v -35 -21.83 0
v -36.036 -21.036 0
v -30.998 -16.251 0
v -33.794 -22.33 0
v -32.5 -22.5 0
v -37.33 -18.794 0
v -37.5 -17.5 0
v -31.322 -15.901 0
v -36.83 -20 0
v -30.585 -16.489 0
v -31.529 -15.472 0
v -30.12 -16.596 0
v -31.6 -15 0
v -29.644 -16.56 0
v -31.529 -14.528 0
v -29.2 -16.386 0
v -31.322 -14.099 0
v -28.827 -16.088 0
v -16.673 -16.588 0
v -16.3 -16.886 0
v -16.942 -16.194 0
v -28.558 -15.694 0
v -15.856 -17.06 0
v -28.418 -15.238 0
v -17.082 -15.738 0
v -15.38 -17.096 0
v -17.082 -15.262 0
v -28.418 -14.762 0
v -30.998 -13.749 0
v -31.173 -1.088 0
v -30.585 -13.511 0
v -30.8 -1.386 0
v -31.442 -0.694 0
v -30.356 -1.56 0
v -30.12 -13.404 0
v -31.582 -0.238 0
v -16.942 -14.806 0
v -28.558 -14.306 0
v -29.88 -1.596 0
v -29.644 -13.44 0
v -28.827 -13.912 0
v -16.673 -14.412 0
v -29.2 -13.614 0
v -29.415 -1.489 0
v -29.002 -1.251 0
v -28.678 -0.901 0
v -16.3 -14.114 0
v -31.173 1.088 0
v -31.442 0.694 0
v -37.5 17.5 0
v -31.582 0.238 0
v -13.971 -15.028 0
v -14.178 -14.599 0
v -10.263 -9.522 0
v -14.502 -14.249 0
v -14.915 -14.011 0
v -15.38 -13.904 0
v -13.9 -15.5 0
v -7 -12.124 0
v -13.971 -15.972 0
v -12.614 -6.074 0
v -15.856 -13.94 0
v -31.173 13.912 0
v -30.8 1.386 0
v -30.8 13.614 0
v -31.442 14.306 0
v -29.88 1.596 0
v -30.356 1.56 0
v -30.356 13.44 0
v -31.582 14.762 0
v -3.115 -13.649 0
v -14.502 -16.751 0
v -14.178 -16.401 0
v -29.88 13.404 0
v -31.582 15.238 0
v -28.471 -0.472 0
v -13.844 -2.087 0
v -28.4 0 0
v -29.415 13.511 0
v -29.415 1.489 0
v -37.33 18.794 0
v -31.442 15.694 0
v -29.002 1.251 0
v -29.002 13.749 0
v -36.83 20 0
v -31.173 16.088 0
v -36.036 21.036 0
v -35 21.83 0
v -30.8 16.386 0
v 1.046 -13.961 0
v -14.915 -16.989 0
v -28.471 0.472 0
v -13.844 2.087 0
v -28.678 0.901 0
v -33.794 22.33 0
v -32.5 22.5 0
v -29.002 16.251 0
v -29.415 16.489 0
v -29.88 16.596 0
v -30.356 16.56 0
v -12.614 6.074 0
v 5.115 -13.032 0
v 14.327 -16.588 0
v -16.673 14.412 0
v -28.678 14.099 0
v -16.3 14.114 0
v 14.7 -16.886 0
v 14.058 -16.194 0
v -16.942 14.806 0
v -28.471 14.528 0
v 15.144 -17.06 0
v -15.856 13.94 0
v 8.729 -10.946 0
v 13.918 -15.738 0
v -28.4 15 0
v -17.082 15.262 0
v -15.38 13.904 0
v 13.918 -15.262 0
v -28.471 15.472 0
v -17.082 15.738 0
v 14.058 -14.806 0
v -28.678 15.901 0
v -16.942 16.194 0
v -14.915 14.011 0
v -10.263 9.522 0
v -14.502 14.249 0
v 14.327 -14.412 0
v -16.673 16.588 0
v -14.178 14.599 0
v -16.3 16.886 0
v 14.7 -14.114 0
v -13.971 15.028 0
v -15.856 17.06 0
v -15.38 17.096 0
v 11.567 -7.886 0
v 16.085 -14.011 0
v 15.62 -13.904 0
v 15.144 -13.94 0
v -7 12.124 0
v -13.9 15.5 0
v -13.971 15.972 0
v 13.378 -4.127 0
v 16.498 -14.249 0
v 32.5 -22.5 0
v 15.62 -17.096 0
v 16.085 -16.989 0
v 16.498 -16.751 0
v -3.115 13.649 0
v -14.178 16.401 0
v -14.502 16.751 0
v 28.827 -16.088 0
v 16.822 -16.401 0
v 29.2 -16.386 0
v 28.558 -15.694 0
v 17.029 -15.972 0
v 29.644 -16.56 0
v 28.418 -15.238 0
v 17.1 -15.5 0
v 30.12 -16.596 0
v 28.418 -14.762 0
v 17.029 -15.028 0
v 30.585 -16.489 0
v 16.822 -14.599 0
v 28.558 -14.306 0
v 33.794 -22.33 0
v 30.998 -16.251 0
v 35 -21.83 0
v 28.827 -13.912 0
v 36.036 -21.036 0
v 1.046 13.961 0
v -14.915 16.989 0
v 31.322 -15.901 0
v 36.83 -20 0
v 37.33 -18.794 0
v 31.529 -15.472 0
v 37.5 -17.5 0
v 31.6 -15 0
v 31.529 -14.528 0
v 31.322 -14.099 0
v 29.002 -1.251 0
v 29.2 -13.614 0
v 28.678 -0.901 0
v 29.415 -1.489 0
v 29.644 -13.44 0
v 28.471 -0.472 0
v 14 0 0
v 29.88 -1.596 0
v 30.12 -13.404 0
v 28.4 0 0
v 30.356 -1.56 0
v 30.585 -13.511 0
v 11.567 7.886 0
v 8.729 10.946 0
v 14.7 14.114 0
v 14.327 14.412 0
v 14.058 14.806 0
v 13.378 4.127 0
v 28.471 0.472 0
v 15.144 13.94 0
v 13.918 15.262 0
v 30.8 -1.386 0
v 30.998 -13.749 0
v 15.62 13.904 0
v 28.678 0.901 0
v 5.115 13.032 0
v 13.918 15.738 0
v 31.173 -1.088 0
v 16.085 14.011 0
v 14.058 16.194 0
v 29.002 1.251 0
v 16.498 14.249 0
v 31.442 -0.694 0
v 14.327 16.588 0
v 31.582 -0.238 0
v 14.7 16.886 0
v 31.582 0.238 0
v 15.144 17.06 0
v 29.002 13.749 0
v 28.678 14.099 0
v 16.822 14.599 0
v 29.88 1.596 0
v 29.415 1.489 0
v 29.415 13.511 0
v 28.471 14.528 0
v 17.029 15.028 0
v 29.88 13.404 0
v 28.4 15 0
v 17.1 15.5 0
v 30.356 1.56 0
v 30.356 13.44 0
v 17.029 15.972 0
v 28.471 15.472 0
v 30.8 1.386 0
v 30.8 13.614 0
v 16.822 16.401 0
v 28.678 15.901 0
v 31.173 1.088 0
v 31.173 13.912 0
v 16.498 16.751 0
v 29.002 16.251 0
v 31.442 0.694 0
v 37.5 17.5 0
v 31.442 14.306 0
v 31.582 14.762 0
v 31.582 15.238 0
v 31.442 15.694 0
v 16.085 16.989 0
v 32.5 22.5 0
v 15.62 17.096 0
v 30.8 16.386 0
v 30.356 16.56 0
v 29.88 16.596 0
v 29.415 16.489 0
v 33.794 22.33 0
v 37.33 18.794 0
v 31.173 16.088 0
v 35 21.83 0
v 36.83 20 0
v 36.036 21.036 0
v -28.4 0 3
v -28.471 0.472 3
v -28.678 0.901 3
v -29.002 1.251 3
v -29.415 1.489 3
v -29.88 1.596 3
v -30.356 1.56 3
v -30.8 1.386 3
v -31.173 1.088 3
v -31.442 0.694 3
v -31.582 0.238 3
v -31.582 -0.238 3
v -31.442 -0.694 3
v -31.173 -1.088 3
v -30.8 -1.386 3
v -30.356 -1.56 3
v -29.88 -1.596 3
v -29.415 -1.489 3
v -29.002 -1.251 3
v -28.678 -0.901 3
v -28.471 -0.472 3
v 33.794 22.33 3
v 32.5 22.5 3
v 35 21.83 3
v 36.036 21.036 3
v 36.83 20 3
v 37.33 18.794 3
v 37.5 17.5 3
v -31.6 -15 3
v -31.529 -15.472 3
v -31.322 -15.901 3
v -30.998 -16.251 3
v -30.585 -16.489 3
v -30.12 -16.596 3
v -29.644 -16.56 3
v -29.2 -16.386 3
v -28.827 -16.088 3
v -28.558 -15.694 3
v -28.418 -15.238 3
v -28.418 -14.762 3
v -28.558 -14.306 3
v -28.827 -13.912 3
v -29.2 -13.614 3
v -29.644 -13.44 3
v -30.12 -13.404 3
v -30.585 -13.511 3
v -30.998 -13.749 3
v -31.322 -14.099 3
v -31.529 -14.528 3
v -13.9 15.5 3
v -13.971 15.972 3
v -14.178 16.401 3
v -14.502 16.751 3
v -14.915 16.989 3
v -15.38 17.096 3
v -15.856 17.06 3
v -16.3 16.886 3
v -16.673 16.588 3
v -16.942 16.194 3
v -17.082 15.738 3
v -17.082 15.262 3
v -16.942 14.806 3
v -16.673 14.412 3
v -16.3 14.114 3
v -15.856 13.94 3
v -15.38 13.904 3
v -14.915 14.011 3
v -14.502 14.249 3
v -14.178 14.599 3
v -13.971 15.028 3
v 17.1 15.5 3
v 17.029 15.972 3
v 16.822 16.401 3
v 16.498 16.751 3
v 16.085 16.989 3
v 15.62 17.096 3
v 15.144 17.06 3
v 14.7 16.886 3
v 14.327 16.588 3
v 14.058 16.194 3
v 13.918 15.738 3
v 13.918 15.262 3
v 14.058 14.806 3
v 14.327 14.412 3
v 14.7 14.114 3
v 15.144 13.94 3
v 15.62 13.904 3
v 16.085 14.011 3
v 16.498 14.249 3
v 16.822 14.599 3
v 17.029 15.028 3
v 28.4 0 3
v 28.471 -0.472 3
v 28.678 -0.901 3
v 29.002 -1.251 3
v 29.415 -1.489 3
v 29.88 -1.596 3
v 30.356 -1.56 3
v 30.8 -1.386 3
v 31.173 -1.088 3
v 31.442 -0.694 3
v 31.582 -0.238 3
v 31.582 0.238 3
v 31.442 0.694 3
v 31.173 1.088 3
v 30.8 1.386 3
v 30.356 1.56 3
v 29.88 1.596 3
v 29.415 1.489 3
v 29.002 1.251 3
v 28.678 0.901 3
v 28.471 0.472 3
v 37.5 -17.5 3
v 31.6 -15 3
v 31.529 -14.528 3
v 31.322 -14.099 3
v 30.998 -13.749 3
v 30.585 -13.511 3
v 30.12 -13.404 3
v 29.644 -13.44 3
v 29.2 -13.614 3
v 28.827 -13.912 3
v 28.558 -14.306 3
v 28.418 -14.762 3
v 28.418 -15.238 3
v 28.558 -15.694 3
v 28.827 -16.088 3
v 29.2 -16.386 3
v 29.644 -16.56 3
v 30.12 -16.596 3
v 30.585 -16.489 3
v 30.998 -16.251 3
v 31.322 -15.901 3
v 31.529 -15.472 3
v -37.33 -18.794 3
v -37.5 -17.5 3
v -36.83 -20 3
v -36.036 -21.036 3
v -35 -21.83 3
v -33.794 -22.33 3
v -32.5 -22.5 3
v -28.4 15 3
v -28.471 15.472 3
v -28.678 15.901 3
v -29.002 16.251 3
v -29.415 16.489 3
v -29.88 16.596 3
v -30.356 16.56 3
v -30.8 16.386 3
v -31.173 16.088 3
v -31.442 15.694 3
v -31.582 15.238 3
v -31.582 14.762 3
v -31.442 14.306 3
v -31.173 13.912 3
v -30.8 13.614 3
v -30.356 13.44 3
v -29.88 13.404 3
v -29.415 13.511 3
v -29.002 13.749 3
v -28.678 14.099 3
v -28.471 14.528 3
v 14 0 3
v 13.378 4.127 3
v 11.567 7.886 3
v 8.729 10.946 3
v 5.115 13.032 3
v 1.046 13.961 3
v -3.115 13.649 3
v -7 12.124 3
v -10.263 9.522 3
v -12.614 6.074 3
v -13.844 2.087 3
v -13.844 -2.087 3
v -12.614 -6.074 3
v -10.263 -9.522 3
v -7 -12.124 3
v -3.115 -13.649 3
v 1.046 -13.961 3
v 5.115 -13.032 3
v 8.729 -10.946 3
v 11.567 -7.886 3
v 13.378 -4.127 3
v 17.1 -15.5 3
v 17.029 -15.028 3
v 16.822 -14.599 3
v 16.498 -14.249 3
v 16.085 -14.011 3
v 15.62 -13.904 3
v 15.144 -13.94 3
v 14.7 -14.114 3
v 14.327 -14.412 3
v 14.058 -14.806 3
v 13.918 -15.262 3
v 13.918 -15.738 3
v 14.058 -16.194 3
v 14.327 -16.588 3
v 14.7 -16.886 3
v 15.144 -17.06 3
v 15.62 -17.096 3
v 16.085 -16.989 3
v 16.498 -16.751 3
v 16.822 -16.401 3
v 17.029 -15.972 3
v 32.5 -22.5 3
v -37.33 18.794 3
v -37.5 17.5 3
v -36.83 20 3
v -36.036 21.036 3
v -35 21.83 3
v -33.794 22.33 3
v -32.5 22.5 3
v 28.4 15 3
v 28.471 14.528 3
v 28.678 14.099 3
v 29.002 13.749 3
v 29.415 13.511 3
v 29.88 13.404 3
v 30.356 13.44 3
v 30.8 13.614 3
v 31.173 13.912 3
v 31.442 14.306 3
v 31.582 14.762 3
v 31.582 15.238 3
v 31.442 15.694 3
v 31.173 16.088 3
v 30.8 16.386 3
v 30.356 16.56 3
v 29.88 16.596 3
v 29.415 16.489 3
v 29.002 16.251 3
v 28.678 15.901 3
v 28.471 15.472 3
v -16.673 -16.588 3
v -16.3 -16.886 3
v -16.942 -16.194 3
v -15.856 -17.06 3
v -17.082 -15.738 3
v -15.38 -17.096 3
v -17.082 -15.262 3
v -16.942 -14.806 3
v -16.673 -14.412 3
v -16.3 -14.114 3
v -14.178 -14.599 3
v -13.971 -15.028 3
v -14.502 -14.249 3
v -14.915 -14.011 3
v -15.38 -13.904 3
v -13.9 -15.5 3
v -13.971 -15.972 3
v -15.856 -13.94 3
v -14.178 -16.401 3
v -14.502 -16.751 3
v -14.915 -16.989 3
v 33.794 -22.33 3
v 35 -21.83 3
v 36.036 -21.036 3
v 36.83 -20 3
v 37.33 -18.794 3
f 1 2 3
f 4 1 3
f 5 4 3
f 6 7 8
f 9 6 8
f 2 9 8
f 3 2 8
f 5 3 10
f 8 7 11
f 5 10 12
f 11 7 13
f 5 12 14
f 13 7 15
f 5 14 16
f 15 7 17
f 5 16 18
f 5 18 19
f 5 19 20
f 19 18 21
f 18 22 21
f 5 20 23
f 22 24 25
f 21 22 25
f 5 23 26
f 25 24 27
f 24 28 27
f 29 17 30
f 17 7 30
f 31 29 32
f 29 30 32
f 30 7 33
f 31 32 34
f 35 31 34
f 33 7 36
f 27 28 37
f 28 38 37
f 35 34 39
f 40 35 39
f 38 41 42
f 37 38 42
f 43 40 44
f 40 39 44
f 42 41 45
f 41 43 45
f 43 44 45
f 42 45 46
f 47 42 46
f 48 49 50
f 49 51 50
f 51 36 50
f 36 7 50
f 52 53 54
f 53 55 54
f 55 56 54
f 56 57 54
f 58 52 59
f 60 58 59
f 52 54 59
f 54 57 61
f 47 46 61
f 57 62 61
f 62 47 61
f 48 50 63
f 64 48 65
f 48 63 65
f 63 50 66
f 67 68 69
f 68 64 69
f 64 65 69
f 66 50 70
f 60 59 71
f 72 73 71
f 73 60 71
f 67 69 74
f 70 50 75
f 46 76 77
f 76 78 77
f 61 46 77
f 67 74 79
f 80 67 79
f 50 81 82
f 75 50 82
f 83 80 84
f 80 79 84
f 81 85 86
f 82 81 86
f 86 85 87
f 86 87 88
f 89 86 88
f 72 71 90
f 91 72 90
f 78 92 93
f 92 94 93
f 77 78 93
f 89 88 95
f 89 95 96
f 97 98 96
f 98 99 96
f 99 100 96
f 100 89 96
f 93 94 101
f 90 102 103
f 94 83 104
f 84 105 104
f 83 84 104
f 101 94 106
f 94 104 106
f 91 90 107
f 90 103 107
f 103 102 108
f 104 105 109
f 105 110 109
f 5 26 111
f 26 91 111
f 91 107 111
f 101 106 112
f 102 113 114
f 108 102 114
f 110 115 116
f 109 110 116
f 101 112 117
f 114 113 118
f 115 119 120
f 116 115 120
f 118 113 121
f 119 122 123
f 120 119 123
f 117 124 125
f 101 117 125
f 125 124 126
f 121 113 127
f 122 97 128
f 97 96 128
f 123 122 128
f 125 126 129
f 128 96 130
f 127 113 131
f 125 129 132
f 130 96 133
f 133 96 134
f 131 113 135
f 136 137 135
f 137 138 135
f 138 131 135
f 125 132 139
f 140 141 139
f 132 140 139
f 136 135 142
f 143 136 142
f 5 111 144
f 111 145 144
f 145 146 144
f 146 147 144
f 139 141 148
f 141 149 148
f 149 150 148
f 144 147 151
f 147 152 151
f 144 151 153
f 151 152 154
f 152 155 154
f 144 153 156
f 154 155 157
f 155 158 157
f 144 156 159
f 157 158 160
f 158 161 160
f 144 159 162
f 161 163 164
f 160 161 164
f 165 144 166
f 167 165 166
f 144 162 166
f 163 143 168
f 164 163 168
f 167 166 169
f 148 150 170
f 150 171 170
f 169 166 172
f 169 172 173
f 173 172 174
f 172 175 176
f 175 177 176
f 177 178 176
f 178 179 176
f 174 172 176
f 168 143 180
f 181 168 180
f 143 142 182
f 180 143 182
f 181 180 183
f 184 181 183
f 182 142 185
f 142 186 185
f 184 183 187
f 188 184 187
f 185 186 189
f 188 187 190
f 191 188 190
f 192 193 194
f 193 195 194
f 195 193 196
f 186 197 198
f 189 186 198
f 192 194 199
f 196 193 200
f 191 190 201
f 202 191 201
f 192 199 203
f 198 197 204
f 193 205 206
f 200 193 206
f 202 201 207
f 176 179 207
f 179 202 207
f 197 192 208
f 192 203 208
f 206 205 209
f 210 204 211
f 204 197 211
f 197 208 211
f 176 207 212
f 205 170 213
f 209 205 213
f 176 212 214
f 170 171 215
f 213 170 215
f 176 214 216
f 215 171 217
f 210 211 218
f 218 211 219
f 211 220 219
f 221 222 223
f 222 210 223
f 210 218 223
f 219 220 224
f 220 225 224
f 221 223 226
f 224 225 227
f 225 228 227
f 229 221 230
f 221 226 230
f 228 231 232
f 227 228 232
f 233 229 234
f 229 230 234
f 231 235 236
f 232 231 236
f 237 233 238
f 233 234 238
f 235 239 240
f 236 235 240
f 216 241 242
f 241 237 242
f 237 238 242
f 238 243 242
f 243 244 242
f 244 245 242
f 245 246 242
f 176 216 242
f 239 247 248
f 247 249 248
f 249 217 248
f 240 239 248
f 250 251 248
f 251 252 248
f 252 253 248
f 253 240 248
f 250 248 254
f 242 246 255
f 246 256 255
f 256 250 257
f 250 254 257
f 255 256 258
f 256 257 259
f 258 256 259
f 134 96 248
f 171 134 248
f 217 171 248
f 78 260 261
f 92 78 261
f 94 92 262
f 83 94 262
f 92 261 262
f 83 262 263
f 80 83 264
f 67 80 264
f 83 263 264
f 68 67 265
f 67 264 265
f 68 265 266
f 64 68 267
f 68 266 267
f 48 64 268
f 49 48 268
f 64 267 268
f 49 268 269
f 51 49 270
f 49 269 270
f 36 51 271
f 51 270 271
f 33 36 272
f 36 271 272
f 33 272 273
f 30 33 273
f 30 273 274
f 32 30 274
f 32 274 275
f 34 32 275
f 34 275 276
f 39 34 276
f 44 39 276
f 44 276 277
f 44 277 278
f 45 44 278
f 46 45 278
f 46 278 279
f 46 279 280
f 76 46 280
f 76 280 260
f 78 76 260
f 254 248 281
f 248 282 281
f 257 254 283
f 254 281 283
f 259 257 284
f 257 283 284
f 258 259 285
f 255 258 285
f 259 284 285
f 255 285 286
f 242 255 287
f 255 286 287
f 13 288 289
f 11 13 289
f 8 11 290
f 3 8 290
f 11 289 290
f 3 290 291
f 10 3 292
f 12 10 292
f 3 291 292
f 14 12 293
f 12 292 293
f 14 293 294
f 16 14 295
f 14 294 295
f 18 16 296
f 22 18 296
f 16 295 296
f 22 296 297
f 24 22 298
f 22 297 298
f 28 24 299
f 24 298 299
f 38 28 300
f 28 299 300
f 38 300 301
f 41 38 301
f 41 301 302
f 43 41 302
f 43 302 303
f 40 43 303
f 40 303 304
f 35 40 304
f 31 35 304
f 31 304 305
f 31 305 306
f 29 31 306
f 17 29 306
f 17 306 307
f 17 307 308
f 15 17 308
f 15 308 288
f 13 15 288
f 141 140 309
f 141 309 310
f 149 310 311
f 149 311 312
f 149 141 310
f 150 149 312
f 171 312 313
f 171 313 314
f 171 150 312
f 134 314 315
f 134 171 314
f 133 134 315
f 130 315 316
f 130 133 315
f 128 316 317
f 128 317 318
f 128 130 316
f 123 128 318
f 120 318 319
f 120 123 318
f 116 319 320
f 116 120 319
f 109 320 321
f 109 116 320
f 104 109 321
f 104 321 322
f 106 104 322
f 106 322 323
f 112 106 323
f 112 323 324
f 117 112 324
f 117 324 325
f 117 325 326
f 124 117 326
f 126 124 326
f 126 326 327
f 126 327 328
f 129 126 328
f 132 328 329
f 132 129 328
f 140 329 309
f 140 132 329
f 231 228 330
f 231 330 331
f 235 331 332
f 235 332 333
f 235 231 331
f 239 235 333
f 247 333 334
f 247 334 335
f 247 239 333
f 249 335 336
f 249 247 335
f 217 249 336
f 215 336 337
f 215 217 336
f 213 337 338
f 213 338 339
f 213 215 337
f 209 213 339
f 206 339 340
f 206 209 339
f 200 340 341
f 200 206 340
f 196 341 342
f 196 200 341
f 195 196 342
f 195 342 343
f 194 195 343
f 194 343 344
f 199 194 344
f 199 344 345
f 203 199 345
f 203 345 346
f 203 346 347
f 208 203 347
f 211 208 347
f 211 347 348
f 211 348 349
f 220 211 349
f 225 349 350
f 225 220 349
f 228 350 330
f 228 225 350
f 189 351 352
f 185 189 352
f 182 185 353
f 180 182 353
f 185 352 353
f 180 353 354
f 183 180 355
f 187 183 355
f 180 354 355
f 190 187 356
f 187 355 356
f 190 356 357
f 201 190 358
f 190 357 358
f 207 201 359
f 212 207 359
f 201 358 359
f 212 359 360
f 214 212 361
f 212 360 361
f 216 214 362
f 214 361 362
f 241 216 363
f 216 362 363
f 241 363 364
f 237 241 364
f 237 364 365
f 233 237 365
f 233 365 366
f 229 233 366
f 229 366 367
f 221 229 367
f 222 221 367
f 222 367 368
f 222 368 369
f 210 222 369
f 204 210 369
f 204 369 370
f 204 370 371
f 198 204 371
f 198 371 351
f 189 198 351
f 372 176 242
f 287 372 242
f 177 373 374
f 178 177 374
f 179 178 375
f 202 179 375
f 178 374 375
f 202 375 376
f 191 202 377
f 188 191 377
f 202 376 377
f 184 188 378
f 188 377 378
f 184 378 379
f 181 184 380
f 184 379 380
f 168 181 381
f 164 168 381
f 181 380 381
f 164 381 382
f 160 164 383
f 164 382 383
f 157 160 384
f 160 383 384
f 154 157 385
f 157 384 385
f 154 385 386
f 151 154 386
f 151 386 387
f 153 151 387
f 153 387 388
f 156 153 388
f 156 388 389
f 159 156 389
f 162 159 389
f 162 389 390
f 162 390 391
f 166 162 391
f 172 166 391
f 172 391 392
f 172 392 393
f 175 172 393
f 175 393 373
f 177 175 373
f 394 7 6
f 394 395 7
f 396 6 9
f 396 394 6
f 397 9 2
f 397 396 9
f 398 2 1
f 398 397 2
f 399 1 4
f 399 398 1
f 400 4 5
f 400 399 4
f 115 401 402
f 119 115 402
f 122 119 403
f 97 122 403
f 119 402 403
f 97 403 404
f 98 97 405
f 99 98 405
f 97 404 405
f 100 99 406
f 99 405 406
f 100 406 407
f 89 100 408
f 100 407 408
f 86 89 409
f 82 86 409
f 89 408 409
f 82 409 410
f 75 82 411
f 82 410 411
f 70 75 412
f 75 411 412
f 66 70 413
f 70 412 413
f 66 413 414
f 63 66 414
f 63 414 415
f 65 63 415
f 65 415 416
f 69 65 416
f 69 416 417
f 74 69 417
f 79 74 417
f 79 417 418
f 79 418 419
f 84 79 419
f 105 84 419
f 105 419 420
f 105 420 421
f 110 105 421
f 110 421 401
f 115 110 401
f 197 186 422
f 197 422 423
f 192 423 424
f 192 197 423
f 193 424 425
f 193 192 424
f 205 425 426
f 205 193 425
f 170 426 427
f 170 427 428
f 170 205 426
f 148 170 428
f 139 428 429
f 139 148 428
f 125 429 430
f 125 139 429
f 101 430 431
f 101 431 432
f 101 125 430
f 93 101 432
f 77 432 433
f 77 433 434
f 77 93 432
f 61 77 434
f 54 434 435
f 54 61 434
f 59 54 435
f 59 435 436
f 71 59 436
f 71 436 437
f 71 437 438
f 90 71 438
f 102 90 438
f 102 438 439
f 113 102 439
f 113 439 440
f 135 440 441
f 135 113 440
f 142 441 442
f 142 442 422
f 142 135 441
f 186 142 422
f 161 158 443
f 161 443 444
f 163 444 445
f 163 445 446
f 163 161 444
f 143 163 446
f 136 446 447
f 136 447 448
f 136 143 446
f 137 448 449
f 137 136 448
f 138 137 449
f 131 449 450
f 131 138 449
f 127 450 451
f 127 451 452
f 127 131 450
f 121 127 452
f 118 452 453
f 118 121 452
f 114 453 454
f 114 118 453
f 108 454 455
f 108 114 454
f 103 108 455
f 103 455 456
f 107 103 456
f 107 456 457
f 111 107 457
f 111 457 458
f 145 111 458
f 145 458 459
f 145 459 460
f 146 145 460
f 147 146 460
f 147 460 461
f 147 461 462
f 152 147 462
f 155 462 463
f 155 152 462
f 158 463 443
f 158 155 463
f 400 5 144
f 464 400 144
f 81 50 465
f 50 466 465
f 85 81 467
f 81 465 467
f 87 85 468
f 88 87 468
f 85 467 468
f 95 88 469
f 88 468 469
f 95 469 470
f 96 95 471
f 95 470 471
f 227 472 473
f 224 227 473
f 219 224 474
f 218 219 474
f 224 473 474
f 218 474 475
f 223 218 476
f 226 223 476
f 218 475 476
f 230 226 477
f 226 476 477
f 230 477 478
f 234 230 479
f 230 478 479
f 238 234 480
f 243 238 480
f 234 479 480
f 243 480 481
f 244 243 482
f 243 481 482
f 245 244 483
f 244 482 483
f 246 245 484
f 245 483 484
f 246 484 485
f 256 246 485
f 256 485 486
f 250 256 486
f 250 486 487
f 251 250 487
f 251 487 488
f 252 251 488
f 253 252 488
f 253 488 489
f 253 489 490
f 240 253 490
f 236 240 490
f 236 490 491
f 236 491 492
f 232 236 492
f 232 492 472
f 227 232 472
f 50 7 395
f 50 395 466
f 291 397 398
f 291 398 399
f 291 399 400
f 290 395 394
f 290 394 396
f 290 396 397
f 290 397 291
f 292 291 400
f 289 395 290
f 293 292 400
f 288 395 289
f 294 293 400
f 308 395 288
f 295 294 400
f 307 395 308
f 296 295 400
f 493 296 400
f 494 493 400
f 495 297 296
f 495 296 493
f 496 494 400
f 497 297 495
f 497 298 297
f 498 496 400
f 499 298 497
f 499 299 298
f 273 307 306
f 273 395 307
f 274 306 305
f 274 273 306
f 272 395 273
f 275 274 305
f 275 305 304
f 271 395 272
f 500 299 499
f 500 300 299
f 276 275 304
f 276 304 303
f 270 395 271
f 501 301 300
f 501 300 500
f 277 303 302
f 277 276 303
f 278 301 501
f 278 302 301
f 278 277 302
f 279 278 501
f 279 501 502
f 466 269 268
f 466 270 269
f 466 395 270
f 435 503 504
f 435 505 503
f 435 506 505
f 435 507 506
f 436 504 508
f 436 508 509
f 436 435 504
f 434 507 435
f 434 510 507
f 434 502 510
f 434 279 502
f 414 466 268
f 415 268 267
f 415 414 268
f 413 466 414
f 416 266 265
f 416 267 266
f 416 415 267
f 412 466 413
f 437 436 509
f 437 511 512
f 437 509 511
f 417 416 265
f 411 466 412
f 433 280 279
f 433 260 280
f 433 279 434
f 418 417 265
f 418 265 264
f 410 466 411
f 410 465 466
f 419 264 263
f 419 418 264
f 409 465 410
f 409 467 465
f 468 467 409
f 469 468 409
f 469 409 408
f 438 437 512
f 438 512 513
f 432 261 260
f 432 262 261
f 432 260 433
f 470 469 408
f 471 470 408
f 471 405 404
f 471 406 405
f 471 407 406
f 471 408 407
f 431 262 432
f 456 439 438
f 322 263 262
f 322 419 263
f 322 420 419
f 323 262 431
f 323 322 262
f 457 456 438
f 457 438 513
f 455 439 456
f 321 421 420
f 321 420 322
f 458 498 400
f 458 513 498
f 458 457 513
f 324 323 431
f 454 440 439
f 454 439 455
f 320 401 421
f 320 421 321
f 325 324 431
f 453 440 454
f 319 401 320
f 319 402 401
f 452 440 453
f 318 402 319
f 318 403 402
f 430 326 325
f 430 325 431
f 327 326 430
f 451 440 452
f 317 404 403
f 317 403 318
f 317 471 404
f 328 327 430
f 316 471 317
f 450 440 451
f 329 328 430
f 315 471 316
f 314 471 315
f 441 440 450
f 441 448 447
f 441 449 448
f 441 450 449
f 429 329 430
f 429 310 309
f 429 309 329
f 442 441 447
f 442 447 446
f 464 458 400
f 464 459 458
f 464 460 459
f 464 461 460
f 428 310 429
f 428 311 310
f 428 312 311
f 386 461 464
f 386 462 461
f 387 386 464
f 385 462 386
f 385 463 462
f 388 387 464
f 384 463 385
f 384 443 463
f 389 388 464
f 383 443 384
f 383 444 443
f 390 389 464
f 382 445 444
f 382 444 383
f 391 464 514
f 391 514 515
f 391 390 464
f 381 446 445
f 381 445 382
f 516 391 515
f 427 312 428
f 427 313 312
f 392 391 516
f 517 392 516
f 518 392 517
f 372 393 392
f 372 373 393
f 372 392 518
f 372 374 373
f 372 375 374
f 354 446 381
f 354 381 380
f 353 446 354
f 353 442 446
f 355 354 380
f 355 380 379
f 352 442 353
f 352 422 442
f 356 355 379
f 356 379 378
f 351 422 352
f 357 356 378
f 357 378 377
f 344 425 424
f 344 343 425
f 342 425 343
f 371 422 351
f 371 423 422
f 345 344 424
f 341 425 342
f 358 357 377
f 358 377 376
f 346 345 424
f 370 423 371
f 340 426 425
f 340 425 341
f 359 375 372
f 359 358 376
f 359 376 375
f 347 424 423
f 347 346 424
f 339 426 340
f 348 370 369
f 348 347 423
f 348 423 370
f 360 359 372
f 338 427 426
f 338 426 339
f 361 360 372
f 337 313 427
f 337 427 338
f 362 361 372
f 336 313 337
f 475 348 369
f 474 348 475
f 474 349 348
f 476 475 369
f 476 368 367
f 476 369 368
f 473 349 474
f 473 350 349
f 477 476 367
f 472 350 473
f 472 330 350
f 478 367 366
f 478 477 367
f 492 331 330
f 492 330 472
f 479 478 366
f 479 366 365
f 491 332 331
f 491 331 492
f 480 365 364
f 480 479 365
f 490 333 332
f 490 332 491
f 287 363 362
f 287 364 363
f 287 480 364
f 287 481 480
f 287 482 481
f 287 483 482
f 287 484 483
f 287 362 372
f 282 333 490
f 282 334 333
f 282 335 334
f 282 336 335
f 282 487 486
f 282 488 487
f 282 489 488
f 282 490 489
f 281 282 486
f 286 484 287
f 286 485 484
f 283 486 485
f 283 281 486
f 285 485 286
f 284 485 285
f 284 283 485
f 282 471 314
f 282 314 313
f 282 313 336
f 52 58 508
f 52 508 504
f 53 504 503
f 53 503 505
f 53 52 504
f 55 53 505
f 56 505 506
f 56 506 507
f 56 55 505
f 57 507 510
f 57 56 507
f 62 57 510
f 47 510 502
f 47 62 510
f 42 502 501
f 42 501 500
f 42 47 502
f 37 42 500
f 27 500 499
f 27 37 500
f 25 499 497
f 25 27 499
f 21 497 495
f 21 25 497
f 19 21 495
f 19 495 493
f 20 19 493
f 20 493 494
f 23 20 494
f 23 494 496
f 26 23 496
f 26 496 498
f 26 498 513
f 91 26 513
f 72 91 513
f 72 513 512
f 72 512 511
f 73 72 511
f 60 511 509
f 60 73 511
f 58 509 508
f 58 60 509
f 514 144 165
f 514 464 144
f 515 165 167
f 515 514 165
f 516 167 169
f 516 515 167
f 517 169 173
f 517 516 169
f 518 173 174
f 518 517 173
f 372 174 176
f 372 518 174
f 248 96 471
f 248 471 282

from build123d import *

# Parameters (mm, degrees)
SKETCH1_W           = 75
SKETCH1_H           = 45
SKETCH1_R           = 14
SKETCH1_R_2         = 1.6
BOSS_EXTRUDE1_DEPTH = 3
FILLET2_R           = 5
SKETCH2_R           = 1.6
CUT_EXTRUDE1_DEPTH  = 44.834917589


with BuildPart() as part:
    # Sketch1 → Boss-Extrude1 (new body)
    with BuildSketch(Plane.XY):
        Rectangle(SKETCH1_W, SKETCH1_H)
        Circle(SKETCH1_R, mode=Mode.SUBTRACT)
        with Locations((-15.5, 15.5)):
            Circle(SKETCH1_R_2, mode=Mode.SUBTRACT)
        with Locations((15.5, 15.5)):
            Circle(SKETCH1_R_2, mode=Mode.SUBTRACT)
        with Locations((15.5, -15.5)):
            Circle(SKETCH1_R_2, mode=Mode.SUBTRACT)
        with Locations((-15.5, -15.5)):
            Circle(SKETCH1_R_2, mode=Mode.SUBTRACT)
    extrude(amount=BOSS_EXTRUDE1_DEPTH)

    # Fillet2
    fillet2_edges = [part.edges().sort_by_distance(p)[0] for p in [
        (37.5, -22.5, 1.5),
        (-37.5, -22.5, 1.5),
        (-37.5, 22.5, 1.5),
        (37.5, 22.5, 1.5),
    ]]
    fillet(fillet2_edges, radius=FILLET2_R)

    # Sketch2 → Cut-Extrude1 (cut, through all)
    with BuildSketch(Plane.XY.offset(3)):
        with Locations((-30, 0)):
            Circle(SKETCH2_R)
        with Locations((-30, 15)):
            Circle(SKETCH2_R)
        with Locations(Location((-30, -15, 0), (0, 0, 180))):
            Circle(SKETCH2_R)
        with Locations((30, -15)):
            Circle(SKETCH2_R)
        with Locations(Location((30, 15, 0), (0, 0, 180))):
            Circle(SKETCH2_R)
        with Locations(Location((30, 0, 0), (0, 0, 180))):
            Circle(SKETCH2_R)
    extrude(amount=-CUT_EXTRUDE1_DEPTH, mode=Mode.SUBTRACT)


solid = part.part
